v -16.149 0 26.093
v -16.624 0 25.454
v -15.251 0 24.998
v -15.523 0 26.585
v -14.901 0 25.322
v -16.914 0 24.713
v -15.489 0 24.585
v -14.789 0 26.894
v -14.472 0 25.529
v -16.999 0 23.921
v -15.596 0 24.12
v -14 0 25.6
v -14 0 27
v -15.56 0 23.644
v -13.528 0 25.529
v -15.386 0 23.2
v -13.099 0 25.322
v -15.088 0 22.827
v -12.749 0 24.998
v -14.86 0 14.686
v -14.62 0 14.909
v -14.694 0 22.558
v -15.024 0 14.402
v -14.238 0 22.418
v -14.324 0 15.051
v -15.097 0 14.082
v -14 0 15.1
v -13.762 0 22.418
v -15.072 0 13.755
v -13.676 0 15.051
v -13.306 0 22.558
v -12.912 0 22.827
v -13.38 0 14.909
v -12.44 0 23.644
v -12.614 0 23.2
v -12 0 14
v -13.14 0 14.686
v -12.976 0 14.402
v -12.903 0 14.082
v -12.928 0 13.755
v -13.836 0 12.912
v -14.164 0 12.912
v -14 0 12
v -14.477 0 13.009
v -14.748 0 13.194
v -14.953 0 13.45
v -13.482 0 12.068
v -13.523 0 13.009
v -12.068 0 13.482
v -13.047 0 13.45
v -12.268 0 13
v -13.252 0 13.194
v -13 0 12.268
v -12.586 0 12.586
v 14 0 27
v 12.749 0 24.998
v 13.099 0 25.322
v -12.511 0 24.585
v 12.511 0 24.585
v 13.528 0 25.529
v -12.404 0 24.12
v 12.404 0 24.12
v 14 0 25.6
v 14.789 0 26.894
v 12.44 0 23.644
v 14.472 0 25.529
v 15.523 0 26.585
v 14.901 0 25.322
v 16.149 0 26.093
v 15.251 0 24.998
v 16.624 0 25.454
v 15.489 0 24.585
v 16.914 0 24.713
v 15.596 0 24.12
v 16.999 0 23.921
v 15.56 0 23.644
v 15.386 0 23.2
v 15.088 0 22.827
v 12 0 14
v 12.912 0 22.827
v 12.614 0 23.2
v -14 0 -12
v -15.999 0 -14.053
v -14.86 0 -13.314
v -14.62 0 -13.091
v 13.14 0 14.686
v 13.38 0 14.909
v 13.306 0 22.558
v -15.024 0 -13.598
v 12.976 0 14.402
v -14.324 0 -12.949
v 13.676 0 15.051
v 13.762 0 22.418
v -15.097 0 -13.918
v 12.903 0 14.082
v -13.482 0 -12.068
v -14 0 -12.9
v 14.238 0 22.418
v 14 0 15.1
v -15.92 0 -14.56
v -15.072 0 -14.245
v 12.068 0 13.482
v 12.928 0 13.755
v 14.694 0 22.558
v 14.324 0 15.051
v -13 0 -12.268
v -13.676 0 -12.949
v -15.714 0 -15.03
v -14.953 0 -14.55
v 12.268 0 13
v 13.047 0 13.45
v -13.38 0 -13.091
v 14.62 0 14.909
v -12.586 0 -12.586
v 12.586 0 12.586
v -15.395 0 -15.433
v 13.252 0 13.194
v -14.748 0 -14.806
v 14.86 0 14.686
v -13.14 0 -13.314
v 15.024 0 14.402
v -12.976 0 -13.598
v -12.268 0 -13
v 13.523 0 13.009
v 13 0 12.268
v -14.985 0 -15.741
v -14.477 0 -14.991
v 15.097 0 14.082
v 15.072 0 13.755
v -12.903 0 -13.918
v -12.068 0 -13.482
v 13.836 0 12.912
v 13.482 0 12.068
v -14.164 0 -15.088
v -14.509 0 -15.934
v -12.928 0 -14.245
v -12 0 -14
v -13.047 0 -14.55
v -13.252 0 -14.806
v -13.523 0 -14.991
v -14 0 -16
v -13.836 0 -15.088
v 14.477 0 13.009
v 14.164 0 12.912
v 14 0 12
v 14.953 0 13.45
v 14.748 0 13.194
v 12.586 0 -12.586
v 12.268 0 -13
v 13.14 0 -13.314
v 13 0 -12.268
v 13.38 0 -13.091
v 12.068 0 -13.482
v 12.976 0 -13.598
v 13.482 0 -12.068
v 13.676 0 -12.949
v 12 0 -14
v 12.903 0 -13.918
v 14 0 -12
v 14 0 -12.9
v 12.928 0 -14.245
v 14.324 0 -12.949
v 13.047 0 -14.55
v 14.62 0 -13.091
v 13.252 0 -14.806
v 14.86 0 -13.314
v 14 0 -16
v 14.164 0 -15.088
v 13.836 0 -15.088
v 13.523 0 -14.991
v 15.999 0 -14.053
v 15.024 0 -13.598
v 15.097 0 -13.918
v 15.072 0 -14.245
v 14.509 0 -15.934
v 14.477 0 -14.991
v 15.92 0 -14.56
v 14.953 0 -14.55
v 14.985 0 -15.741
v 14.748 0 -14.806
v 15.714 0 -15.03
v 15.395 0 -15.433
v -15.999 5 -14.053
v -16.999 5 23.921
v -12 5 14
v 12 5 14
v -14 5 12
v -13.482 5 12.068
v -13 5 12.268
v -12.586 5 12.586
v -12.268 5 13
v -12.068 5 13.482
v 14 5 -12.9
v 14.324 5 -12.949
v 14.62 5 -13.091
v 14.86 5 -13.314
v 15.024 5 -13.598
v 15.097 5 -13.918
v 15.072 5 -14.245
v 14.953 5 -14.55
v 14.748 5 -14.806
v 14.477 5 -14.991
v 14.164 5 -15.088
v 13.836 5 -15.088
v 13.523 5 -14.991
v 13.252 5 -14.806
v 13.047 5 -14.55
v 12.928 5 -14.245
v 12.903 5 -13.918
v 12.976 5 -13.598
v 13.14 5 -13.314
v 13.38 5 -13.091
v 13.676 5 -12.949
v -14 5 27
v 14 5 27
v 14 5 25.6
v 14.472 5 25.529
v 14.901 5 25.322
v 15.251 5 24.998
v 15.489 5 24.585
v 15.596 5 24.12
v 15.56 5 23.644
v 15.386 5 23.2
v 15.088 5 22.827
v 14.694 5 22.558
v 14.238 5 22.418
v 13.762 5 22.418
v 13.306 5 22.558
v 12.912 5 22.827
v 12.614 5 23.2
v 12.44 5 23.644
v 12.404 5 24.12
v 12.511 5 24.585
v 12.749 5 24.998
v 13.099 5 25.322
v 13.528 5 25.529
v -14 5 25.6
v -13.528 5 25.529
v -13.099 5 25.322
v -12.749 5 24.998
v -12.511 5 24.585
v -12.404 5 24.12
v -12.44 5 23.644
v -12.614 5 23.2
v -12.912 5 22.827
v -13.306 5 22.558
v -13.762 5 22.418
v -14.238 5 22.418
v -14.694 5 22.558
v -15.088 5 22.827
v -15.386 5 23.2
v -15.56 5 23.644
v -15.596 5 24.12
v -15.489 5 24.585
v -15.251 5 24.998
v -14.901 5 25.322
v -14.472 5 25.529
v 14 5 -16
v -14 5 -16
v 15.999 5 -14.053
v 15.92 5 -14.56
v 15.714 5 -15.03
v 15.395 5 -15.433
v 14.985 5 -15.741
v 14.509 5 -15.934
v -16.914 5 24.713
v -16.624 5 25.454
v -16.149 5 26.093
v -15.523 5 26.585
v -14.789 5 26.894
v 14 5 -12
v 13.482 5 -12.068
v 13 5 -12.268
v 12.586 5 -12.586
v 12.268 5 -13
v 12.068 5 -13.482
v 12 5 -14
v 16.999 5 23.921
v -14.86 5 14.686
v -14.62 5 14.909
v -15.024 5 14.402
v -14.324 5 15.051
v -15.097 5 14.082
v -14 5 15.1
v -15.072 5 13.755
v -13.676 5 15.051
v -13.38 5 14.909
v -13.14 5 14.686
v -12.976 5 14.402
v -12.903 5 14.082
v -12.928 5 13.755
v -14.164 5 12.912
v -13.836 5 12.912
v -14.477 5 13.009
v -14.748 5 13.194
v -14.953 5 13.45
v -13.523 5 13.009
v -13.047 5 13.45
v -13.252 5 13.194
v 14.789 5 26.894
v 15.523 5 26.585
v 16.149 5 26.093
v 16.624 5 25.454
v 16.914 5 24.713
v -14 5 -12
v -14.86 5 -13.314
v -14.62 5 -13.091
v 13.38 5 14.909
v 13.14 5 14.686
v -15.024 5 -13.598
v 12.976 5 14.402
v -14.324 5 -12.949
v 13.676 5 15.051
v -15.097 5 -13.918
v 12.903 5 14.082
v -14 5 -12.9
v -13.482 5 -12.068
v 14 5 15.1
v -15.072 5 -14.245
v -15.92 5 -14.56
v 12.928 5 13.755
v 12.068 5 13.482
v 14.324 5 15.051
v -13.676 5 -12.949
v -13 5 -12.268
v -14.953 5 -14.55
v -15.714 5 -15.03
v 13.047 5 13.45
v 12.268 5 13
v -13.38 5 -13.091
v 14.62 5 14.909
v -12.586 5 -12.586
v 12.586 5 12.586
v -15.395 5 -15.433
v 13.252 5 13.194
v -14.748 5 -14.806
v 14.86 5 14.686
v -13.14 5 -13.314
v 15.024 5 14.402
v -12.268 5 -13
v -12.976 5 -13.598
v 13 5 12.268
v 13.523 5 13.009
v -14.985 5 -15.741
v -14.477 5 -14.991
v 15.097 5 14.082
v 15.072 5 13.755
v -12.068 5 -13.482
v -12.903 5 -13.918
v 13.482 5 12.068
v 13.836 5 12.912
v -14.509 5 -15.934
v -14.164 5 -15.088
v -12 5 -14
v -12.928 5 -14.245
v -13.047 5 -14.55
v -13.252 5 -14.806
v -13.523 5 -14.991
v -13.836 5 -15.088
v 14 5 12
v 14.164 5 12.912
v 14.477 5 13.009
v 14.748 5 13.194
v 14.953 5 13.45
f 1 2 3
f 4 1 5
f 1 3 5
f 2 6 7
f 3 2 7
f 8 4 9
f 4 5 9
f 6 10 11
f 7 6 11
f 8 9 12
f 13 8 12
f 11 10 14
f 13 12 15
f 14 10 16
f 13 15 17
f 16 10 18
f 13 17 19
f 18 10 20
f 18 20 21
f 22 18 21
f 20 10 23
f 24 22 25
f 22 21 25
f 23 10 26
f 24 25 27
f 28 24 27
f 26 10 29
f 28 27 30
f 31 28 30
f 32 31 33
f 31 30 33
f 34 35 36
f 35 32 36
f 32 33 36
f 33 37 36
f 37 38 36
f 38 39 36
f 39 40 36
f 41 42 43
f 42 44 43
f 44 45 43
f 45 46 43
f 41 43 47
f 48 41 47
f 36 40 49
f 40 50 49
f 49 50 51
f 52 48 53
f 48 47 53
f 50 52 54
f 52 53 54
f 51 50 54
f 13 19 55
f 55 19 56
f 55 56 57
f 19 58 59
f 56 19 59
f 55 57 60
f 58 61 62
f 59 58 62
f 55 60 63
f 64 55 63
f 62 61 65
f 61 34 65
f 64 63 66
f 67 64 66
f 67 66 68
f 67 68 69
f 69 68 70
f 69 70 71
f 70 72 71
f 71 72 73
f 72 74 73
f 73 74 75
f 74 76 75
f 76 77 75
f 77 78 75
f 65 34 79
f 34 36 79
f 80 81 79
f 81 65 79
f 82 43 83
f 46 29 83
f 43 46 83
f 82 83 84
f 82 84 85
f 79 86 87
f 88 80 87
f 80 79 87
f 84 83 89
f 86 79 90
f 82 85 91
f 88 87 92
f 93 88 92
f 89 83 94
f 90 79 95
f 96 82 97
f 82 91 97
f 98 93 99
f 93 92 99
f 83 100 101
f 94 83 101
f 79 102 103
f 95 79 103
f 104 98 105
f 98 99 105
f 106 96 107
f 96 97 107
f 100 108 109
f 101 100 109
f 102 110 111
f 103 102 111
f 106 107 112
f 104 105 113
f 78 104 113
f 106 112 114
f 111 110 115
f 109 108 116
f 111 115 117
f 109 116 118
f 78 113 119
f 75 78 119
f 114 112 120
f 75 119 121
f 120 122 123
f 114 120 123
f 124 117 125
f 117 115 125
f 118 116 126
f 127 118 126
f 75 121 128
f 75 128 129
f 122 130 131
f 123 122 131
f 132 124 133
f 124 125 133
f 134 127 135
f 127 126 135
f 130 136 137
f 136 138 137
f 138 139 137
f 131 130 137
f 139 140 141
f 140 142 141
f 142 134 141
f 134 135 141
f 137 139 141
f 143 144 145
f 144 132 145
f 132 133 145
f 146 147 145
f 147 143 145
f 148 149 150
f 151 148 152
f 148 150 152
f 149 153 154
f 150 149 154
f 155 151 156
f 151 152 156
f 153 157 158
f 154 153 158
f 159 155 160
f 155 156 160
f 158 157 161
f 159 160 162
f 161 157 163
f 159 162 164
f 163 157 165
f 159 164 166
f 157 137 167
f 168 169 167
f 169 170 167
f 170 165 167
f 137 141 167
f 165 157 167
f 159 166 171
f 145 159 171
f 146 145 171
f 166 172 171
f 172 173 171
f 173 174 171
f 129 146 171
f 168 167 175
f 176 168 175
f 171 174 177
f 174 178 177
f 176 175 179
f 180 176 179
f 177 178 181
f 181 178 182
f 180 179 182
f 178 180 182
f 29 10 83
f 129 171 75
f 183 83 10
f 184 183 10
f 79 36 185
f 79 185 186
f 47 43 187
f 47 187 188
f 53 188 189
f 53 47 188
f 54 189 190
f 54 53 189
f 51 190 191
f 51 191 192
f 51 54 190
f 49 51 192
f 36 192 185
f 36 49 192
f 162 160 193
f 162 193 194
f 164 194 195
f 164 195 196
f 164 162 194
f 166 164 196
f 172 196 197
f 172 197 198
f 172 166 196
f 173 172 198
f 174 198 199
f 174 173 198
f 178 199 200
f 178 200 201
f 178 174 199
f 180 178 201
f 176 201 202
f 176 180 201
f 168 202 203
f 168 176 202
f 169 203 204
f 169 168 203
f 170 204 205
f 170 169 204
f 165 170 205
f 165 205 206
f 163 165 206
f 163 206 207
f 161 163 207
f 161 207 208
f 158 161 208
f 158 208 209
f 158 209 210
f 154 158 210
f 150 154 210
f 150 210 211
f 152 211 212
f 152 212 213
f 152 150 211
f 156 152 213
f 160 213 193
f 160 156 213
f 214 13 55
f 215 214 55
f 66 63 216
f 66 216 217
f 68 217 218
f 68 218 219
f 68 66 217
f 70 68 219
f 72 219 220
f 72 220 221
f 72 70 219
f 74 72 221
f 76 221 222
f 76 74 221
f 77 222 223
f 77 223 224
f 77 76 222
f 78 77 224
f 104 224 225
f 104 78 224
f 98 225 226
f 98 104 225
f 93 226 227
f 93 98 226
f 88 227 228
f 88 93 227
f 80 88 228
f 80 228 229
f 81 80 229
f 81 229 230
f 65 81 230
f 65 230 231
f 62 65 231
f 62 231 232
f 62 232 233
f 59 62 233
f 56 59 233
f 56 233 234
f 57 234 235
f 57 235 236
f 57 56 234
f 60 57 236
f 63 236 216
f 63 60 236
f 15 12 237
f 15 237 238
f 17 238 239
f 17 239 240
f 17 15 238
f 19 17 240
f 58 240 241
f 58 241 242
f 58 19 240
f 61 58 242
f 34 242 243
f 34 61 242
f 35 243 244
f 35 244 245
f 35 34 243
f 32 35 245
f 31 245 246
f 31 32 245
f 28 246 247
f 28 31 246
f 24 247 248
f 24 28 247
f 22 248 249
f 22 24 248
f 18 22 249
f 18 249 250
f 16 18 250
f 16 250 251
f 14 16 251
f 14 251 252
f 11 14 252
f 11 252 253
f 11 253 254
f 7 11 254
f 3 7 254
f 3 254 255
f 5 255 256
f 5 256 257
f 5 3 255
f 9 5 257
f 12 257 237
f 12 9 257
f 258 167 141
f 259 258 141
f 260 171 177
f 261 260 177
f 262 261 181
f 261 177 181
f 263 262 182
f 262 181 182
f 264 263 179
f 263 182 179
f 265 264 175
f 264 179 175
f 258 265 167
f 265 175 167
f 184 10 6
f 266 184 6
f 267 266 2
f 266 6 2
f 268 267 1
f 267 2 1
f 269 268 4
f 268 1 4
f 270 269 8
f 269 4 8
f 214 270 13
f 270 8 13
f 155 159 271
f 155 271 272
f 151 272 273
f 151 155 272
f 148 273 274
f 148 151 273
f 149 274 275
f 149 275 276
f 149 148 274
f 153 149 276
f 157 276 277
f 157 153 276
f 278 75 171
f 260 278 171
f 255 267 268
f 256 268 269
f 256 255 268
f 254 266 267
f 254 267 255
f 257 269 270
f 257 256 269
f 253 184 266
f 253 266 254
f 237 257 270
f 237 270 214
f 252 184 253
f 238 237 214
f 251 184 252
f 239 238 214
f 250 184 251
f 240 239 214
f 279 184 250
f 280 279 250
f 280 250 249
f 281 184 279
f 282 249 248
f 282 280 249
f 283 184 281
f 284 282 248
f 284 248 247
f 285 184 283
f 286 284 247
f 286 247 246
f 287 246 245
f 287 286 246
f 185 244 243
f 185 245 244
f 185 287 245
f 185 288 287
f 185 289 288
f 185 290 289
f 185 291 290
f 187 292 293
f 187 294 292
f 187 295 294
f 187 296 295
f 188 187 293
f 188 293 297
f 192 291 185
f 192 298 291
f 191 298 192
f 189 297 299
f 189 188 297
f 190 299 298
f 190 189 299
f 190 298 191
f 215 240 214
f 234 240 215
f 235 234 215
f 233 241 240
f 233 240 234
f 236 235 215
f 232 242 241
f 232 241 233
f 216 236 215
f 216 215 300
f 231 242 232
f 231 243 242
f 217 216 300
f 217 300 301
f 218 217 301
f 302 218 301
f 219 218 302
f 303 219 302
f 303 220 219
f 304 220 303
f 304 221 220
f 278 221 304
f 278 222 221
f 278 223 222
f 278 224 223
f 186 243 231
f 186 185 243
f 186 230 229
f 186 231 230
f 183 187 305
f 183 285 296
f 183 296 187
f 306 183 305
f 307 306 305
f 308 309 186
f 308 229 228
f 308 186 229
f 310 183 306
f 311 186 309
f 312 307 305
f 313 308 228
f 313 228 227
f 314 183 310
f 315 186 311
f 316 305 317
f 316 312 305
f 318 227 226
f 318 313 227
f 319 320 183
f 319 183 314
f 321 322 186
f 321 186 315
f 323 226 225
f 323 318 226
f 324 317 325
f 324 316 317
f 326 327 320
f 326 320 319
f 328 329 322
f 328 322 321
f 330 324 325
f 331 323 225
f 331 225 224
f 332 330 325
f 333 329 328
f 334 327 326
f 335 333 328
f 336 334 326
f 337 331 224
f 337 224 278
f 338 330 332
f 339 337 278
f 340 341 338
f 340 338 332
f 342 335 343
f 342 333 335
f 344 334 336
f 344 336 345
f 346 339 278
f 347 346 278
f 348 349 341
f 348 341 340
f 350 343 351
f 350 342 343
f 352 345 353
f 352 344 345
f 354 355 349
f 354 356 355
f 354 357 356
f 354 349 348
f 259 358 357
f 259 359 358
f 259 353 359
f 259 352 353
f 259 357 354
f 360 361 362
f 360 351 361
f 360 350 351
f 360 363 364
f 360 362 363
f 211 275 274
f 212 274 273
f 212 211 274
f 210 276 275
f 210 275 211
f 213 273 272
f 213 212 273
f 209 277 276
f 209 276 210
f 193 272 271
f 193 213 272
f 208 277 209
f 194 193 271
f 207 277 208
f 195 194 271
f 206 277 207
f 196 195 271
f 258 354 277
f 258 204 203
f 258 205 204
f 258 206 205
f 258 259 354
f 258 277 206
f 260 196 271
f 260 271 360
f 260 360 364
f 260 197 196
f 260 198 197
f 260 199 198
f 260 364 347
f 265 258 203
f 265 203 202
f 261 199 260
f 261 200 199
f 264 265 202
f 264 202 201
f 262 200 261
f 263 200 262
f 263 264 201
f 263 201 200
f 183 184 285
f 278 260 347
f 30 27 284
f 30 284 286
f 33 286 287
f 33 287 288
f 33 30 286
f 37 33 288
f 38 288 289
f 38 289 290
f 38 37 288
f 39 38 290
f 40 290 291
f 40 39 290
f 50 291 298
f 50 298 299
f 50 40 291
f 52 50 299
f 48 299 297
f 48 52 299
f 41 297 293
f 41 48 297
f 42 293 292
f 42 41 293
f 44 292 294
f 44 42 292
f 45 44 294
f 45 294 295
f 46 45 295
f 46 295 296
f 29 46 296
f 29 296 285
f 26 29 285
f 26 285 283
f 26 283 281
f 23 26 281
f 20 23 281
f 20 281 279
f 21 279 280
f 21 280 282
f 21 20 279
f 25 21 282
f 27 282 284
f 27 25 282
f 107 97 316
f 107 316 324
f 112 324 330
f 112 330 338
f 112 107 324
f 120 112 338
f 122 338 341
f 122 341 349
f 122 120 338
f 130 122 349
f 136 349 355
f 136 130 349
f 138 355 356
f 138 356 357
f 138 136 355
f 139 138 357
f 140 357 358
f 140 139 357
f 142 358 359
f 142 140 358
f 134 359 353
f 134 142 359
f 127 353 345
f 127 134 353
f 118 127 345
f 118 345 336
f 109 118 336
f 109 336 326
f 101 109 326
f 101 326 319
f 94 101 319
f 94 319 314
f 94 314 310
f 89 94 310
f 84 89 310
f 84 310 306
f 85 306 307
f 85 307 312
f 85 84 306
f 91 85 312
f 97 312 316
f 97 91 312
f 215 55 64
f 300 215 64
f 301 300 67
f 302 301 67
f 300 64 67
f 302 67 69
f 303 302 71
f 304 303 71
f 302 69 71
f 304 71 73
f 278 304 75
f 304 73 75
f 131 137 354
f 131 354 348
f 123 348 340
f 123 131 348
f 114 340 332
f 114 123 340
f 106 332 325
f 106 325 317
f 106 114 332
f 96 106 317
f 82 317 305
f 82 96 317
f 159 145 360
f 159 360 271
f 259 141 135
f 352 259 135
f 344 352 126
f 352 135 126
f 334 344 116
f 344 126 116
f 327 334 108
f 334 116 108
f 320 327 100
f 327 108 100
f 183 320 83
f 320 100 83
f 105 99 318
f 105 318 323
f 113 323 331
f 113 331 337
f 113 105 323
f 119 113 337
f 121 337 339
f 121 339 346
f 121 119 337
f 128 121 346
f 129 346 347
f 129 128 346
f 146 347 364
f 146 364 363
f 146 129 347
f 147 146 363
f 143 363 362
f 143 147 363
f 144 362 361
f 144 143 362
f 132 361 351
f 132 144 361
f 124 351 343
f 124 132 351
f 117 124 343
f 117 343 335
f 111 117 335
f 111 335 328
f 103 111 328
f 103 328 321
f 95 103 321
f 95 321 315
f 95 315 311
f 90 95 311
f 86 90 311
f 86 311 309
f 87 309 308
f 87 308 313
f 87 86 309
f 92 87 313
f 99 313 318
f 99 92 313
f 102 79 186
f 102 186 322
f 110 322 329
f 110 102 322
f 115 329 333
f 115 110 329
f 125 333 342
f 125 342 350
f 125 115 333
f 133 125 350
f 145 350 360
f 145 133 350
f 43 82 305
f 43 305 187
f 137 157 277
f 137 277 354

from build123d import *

# Parameters (mm, degrees)
SKETCH_1_R      = 1.1
SKETCH_1_R_2    = 1.6
EXTRUDE_1_DEPTH = 5


with BuildPart() as part:
    # ｽｹｯﾁ1 → ﾎﾞｽ - 押し出し1 (new body)
    with BuildSketch(Plane(origin=(0, 0, 0), x_dir=(1, 0, 0), z_dir=(0, 1, 0))):
        with BuildLine():
            Line((-15.999307359, 14.052631579), (-16.998961039, -23.921052632))
            ThreePointArc((-16.998961039, -23.921052632), (-16.149051198, -26.093222145), (-14, -27))
            Line((-14, -27), (14, -27))
            ThreePointArc((14, -27), (16.149051198, -26.093222145), (16.998961039, -23.921052632))
            Line((16.998961039, -23.921052632), (15.999307359, 14.052631579))
            ThreePointArc((15.999307359, 14.052631579), (15.39548143, 15.432700799), (14, 16))
            Line((14, 16), (-14, 16))
            ThreePointArc((-14, 16), (-15.39548143, 15.432700799), (-15.999307359, 14.052631579))
        make_face()
        with Locations(Location((-14, 14, 0), (0, 0, 270))):
            Circle(SKETCH_1_R, mode=Mode.SUBTRACT)
        with Locations(Location((14, 14, 0), (0, 0, 270))):
            Circle(SKETCH_1_R, mode=Mode.SUBTRACT)
        with Locations(Location((14, -14, 0), (0, 0, 270))):
            Circle(SKETCH_1_R, mode=Mode.SUBTRACT)
        with Locations(Location((-14, -14, 0), (0, 0, 270))):
            Circle(SKETCH_1_R, mode=Mode.SUBTRACT)
        with Locations(Location((-14, -24, 0), (0, 0, 270))):
            Circle(SKETCH_1_R_2, mode=Mode.SUBTRACT)
        with Locations(Location((14, -24, 0), (0, 0, 270))):
            Circle(SKETCH_1_R_2, mode=Mode.SUBTRACT)
        with BuildLine():
            Line((-14, 12), (-14, -12))
            ThreePointArc((-14, -12), (-12.585786438, -12.585786438), (-12, -14))
            Line((-12, -14), (12, -14))
            ThreePointArc((12, -14), (12.585786438, -12.585786438), (14, -12))
            Line((14, -12), (14, 12))
            ThreePointArc((14, 12), (12.585786438, 12.585786438), (12, 14))
            Line((12, 14), (-12, 14))
            ThreePointArc((-12, 14), (-12.585786438, 12.585786438), (-14, 12))
        make_face(mode=Mode.SUBTRACT)
    extrude(amount=EXTRUDE_1_DEPTH)


solid = part.part
